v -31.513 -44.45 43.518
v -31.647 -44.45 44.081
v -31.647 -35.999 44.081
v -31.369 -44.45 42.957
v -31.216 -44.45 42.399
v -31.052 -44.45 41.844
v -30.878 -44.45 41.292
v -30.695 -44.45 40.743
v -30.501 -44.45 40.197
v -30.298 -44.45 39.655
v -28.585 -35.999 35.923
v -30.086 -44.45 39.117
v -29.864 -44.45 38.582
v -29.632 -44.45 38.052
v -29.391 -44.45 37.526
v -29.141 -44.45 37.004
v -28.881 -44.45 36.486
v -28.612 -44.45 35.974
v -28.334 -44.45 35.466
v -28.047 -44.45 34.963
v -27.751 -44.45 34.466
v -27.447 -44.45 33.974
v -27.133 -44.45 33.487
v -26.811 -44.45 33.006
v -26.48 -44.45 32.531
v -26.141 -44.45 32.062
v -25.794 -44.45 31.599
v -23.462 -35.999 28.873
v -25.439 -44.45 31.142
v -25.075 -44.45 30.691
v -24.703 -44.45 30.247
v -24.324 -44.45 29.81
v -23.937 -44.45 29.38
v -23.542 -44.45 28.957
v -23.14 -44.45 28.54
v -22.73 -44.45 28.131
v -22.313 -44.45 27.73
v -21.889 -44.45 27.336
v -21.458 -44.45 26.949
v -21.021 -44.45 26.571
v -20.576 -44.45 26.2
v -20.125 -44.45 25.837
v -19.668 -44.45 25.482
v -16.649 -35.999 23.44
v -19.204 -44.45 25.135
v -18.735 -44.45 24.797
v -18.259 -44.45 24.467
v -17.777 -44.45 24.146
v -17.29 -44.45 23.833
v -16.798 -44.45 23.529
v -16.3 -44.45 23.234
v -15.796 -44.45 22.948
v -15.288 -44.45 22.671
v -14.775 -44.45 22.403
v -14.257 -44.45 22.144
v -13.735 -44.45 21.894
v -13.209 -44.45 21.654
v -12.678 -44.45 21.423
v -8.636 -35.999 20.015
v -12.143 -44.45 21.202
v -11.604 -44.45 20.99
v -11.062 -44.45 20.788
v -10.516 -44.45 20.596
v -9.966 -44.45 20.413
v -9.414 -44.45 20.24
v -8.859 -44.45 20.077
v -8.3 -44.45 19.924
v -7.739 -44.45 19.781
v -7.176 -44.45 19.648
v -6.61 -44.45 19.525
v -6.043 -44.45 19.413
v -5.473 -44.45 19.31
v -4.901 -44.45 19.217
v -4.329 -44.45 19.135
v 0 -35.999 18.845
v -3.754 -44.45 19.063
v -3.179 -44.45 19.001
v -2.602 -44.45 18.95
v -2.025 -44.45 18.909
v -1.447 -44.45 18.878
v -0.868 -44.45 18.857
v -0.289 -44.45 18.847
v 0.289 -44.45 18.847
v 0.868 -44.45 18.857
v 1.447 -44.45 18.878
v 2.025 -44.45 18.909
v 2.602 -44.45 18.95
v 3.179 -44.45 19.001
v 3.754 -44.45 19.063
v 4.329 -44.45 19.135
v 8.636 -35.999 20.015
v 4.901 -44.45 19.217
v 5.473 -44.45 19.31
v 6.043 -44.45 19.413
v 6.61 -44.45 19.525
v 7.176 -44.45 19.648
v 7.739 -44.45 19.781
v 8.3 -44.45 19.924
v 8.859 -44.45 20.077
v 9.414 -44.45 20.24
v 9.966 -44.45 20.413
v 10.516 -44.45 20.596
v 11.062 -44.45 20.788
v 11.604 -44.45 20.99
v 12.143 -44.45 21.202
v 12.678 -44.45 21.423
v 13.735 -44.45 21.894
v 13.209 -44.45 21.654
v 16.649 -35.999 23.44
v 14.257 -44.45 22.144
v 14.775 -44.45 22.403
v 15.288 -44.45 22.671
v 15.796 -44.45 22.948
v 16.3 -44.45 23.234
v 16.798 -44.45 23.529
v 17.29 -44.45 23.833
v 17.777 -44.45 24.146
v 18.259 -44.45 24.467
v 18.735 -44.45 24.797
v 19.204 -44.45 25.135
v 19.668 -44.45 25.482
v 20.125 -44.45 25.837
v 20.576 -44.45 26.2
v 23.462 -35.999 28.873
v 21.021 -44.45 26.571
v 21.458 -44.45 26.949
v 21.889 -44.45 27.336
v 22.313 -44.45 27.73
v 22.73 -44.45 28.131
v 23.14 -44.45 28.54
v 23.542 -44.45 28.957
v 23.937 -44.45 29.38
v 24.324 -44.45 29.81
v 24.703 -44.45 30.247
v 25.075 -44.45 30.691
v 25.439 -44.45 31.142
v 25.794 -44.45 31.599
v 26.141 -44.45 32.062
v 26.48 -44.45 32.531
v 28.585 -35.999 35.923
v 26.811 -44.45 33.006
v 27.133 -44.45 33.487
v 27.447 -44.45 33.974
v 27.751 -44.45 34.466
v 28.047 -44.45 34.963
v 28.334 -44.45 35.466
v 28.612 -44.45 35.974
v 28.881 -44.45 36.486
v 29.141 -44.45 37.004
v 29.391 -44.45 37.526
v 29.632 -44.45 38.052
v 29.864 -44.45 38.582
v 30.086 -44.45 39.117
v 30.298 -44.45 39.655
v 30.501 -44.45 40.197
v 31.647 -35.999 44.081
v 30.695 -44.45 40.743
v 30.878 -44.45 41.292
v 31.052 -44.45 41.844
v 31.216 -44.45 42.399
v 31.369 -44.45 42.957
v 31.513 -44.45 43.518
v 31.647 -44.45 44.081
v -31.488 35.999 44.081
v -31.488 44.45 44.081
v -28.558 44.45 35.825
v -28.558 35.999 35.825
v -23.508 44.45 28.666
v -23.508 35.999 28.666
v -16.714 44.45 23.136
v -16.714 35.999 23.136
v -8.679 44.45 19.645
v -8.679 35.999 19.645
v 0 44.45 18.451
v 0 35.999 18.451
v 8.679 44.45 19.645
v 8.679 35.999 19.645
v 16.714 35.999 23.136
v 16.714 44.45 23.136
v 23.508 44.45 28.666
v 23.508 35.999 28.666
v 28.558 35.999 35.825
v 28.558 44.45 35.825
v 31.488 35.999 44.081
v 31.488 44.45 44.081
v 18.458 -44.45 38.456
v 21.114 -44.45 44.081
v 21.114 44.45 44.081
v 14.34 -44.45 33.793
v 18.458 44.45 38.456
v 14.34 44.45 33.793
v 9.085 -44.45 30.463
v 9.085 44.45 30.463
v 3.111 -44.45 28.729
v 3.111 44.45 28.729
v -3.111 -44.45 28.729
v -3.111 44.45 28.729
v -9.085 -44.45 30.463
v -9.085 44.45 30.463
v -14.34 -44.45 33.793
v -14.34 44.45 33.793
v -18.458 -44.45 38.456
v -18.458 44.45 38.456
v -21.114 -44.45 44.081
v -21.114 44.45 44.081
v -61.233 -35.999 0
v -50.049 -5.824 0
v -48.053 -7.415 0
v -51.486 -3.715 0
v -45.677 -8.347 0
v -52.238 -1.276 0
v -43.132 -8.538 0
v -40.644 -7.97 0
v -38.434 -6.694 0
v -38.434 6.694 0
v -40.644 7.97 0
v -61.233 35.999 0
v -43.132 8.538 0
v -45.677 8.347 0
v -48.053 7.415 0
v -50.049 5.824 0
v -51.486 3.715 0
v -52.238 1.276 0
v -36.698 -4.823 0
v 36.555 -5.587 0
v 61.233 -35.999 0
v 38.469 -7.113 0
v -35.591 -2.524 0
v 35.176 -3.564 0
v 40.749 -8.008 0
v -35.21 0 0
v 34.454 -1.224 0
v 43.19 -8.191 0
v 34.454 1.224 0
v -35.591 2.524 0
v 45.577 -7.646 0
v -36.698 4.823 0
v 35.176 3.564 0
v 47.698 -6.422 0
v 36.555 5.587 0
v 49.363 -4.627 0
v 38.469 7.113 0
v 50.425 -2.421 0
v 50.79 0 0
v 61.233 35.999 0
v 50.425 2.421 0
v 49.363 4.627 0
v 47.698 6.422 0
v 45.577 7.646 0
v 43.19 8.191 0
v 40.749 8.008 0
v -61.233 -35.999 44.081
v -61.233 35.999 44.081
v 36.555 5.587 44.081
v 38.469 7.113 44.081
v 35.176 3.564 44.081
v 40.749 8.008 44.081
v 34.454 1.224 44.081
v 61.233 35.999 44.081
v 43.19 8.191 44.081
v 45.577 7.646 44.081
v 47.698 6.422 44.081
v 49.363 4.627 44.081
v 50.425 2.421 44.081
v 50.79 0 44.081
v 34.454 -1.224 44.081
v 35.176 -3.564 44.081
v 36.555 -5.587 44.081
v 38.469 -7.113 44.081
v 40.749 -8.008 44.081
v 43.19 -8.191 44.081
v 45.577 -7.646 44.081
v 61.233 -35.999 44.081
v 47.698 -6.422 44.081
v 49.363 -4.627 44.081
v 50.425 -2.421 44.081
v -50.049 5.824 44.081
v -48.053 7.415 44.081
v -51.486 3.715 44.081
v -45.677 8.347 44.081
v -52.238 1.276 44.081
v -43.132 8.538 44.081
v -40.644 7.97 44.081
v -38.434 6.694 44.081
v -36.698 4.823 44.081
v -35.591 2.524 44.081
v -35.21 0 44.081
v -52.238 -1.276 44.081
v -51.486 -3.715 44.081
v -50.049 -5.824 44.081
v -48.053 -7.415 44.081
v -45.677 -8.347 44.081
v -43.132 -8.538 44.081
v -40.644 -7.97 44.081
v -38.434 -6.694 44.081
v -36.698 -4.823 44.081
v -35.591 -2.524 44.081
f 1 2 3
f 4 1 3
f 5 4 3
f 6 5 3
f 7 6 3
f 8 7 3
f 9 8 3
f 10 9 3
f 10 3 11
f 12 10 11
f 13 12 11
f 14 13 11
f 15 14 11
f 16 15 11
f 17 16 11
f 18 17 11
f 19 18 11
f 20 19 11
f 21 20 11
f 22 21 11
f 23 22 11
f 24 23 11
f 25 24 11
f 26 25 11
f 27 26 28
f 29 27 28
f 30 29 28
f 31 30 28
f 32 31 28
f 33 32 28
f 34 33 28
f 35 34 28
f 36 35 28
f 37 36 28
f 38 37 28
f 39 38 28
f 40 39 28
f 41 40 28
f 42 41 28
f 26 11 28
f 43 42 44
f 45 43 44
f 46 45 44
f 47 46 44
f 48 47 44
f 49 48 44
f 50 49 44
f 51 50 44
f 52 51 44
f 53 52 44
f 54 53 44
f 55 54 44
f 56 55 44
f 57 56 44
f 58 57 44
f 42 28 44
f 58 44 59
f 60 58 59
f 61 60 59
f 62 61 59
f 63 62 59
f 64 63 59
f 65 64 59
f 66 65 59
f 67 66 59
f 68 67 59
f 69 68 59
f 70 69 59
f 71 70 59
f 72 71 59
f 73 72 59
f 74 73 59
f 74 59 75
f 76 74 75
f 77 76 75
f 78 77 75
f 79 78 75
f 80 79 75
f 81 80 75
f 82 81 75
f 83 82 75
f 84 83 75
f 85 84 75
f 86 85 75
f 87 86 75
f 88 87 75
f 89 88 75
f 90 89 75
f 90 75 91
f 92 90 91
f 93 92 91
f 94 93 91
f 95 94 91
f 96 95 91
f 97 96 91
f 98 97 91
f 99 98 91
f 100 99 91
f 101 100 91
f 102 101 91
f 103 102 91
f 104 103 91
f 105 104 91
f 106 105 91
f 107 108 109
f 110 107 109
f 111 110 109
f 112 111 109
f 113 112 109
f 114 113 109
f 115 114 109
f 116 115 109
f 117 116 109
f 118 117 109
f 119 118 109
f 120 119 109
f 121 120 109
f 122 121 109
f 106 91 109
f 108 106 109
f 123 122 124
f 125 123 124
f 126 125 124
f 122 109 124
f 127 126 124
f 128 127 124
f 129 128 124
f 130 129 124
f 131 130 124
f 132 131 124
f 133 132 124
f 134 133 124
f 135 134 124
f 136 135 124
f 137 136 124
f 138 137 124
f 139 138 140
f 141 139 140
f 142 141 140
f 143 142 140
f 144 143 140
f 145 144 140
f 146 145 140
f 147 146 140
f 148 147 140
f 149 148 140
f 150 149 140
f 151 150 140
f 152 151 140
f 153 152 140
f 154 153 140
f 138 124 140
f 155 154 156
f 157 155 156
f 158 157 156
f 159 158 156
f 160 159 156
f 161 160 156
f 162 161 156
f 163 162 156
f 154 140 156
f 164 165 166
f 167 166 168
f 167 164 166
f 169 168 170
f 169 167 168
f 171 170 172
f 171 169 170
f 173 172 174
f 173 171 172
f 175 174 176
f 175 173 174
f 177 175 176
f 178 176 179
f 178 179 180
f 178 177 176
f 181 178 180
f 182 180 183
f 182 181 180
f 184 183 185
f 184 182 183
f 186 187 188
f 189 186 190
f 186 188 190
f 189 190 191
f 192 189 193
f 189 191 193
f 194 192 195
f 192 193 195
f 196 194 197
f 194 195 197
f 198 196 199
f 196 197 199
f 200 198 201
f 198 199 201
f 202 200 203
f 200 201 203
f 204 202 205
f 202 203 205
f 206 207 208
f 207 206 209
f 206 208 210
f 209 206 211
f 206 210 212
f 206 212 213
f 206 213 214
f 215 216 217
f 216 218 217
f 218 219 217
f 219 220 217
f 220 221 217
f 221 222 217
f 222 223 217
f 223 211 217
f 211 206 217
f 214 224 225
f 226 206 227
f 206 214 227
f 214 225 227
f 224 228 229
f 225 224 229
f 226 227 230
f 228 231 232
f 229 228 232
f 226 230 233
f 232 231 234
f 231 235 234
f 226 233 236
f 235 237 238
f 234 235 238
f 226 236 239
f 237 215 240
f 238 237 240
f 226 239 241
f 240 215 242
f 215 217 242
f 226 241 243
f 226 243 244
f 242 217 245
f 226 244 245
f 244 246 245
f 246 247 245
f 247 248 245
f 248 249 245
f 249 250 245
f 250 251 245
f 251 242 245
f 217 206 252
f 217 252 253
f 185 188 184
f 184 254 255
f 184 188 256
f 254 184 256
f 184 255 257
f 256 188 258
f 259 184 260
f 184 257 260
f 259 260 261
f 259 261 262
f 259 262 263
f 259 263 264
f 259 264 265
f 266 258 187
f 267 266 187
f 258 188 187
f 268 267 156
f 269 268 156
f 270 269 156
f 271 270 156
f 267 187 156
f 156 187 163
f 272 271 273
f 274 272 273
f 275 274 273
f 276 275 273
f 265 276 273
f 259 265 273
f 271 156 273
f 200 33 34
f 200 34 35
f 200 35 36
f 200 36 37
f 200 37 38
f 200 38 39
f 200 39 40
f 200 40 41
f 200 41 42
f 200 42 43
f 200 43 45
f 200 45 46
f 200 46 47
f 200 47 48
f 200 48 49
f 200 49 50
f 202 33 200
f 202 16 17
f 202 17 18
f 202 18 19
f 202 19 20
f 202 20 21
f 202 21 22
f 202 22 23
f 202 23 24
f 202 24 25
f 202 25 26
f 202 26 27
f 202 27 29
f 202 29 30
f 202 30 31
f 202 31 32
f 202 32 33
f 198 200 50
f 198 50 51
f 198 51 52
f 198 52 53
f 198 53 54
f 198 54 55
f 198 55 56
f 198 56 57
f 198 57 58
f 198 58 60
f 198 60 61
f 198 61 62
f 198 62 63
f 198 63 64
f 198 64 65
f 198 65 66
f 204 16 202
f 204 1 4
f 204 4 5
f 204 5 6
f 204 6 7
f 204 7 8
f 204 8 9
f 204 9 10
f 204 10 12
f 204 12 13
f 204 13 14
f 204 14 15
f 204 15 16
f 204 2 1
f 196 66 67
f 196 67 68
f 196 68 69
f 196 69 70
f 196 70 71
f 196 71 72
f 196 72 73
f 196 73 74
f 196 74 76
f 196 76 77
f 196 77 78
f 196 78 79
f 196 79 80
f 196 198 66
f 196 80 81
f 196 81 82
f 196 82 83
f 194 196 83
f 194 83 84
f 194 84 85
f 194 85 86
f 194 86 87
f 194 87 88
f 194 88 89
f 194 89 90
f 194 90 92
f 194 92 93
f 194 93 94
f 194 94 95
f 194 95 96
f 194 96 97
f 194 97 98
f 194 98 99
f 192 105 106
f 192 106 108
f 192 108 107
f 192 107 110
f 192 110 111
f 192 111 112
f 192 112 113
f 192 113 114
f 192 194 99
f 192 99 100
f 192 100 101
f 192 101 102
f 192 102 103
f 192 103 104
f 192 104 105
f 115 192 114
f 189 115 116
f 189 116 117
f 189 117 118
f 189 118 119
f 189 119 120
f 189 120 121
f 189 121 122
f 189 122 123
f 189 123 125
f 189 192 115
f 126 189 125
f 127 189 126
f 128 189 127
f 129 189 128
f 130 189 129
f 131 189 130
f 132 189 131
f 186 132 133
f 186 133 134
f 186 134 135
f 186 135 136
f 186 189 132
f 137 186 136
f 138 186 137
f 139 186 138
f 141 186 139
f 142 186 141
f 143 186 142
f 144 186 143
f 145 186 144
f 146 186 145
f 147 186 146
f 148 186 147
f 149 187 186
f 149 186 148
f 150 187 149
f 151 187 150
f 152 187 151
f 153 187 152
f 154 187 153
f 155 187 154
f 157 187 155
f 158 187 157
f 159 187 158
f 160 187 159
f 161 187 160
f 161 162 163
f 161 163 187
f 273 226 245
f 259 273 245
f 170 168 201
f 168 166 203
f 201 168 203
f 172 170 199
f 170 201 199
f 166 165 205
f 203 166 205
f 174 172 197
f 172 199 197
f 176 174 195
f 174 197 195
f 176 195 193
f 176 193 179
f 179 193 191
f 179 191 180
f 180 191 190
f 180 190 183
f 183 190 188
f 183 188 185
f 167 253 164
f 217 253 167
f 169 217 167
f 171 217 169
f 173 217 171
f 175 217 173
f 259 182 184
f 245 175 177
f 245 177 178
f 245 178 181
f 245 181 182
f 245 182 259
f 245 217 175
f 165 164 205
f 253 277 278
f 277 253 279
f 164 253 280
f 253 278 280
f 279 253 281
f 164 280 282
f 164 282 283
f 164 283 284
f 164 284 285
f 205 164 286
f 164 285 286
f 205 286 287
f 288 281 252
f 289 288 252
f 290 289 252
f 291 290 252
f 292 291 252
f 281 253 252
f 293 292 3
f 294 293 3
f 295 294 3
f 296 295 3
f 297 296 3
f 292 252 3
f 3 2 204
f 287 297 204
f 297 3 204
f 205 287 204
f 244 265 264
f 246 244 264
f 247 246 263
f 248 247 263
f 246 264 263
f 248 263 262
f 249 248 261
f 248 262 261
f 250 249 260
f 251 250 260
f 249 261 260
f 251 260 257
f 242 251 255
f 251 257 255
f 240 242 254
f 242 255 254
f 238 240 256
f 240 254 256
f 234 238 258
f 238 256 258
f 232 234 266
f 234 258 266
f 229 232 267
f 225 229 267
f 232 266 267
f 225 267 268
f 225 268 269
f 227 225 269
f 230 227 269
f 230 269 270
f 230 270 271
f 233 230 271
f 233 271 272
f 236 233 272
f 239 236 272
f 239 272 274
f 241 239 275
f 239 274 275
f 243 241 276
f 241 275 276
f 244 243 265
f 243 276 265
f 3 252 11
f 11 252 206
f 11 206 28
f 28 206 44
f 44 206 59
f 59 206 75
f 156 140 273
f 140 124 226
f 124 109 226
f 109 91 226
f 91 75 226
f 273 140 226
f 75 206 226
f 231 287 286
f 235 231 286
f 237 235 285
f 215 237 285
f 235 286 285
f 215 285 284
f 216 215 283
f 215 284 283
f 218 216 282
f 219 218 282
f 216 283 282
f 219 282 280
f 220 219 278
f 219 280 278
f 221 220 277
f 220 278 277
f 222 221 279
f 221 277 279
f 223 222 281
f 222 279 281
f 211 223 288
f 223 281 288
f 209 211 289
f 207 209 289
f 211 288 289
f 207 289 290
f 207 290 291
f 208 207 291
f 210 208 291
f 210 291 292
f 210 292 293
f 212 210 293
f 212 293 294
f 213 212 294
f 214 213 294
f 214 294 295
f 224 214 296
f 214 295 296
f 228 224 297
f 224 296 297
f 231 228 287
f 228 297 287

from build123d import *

# Parameters (mm, degrees)
F0_W      = 122.466728
F0_H      = 71.997046
F1_DEPTH  = 76.2
F2_R      = 32.46156
F3_DEPTH  = 44.45
F4_R      = 32.157743
F5_DEPTH  = 44.45
F6_R      = 22.1
F7_DEPTH  = 88.901
F8_R      = 8.5618
F8_R_2    = 8.213931
F9_DEPTH  = 76.201
F10_W     = 122.466728
F10_H     = 40.422514
F11_DEPTH = 80.449523
F12_W     = 122.765154
F12_H     = 41.263021
F13_DEPTH = 80.449523
F15_DEPTH = 8.452477


with BuildPart() as f1:
    # F0 (on Top) → F1 (new body)
    with BuildSketch(Plane.XY):
        Rectangle(F0_W, F0_H)
    extrude(amount=F1_DEPTH)

    # F2 (on Front) → F3 (join)
    with BuildSketch(Plane.XZ):
        with Locations((0, 51.306862)):
            Circle(F2_R)
    extrude(amount=F3_DEPTH)

    # F4 (on Front) → F5 (join)
    with BuildSketch(Plane.XZ):
        with Locations((0, 50.609048)):
            Circle(F4_R)
    extrude(amount=-F5_DEPTH)

    # F6 (on face) → F7 (cut, through all)
    with BuildSketch(Plane(origin=(0, 44.45, 0), x_dir=(-1, 0, 0), z_dir=(0, 1, 0))):
        with Locations((0, 50.609048)):
            Circle(F6_R)
    extrude(amount=-F7_DEPTH, mode=Mode.SUBTRACT)

    # F8 (on face) → F9 (cut, through all)
    with BuildSketch(Plane.XY.offset(76.2)):
        with Locations((-43.772288, 0)):
            Circle(F8_R)
        with Locations((42.576324, 0)):
            Circle(F8_R_2)
    extrude(amount=-F9_DEPTH, mode=Mode.SUBTRACT)

    # F10 (on face) → F11 (cut, through all)
    with BuildSketch(Plane.XZ.offset(35.998523)):
        with Locations((0, 64.292446)):
            Rectangle(F10_W, F10_H)
    extrude(amount=-F11_DEPTH, mode=Mode.SUBTRACT)

    # F12 (on face) → F13 (cut, through all)
    with BuildSketch(Plane.XZ.offset(35.998523)):
        with Locations((0.149213, 64.712699)):
            Rectangle(F12_W, F12_H)
    extrude(amount=-F13_DEPTH, mode=Mode.SUBTRACT)

    # F14 (on face) → F15 (cut, through all)
    with BuildSketch(Plane(origin=(0, -35.998523, 0), x_dir=(-1, 0, 0), z_dir=(0, 1, 0))):
        with BuildLine():
            Line((-31.647156, 44.081189), (31.647156, 44.081189))
            ThreePointArc((31.647156, 44.081189), (0, 84.199368), (-31.647156, 44.081189))
        make_face()
    extrude(amount=-F15_DEPTH, mode=Mode.SUBTRACT)


solid = f1.part
